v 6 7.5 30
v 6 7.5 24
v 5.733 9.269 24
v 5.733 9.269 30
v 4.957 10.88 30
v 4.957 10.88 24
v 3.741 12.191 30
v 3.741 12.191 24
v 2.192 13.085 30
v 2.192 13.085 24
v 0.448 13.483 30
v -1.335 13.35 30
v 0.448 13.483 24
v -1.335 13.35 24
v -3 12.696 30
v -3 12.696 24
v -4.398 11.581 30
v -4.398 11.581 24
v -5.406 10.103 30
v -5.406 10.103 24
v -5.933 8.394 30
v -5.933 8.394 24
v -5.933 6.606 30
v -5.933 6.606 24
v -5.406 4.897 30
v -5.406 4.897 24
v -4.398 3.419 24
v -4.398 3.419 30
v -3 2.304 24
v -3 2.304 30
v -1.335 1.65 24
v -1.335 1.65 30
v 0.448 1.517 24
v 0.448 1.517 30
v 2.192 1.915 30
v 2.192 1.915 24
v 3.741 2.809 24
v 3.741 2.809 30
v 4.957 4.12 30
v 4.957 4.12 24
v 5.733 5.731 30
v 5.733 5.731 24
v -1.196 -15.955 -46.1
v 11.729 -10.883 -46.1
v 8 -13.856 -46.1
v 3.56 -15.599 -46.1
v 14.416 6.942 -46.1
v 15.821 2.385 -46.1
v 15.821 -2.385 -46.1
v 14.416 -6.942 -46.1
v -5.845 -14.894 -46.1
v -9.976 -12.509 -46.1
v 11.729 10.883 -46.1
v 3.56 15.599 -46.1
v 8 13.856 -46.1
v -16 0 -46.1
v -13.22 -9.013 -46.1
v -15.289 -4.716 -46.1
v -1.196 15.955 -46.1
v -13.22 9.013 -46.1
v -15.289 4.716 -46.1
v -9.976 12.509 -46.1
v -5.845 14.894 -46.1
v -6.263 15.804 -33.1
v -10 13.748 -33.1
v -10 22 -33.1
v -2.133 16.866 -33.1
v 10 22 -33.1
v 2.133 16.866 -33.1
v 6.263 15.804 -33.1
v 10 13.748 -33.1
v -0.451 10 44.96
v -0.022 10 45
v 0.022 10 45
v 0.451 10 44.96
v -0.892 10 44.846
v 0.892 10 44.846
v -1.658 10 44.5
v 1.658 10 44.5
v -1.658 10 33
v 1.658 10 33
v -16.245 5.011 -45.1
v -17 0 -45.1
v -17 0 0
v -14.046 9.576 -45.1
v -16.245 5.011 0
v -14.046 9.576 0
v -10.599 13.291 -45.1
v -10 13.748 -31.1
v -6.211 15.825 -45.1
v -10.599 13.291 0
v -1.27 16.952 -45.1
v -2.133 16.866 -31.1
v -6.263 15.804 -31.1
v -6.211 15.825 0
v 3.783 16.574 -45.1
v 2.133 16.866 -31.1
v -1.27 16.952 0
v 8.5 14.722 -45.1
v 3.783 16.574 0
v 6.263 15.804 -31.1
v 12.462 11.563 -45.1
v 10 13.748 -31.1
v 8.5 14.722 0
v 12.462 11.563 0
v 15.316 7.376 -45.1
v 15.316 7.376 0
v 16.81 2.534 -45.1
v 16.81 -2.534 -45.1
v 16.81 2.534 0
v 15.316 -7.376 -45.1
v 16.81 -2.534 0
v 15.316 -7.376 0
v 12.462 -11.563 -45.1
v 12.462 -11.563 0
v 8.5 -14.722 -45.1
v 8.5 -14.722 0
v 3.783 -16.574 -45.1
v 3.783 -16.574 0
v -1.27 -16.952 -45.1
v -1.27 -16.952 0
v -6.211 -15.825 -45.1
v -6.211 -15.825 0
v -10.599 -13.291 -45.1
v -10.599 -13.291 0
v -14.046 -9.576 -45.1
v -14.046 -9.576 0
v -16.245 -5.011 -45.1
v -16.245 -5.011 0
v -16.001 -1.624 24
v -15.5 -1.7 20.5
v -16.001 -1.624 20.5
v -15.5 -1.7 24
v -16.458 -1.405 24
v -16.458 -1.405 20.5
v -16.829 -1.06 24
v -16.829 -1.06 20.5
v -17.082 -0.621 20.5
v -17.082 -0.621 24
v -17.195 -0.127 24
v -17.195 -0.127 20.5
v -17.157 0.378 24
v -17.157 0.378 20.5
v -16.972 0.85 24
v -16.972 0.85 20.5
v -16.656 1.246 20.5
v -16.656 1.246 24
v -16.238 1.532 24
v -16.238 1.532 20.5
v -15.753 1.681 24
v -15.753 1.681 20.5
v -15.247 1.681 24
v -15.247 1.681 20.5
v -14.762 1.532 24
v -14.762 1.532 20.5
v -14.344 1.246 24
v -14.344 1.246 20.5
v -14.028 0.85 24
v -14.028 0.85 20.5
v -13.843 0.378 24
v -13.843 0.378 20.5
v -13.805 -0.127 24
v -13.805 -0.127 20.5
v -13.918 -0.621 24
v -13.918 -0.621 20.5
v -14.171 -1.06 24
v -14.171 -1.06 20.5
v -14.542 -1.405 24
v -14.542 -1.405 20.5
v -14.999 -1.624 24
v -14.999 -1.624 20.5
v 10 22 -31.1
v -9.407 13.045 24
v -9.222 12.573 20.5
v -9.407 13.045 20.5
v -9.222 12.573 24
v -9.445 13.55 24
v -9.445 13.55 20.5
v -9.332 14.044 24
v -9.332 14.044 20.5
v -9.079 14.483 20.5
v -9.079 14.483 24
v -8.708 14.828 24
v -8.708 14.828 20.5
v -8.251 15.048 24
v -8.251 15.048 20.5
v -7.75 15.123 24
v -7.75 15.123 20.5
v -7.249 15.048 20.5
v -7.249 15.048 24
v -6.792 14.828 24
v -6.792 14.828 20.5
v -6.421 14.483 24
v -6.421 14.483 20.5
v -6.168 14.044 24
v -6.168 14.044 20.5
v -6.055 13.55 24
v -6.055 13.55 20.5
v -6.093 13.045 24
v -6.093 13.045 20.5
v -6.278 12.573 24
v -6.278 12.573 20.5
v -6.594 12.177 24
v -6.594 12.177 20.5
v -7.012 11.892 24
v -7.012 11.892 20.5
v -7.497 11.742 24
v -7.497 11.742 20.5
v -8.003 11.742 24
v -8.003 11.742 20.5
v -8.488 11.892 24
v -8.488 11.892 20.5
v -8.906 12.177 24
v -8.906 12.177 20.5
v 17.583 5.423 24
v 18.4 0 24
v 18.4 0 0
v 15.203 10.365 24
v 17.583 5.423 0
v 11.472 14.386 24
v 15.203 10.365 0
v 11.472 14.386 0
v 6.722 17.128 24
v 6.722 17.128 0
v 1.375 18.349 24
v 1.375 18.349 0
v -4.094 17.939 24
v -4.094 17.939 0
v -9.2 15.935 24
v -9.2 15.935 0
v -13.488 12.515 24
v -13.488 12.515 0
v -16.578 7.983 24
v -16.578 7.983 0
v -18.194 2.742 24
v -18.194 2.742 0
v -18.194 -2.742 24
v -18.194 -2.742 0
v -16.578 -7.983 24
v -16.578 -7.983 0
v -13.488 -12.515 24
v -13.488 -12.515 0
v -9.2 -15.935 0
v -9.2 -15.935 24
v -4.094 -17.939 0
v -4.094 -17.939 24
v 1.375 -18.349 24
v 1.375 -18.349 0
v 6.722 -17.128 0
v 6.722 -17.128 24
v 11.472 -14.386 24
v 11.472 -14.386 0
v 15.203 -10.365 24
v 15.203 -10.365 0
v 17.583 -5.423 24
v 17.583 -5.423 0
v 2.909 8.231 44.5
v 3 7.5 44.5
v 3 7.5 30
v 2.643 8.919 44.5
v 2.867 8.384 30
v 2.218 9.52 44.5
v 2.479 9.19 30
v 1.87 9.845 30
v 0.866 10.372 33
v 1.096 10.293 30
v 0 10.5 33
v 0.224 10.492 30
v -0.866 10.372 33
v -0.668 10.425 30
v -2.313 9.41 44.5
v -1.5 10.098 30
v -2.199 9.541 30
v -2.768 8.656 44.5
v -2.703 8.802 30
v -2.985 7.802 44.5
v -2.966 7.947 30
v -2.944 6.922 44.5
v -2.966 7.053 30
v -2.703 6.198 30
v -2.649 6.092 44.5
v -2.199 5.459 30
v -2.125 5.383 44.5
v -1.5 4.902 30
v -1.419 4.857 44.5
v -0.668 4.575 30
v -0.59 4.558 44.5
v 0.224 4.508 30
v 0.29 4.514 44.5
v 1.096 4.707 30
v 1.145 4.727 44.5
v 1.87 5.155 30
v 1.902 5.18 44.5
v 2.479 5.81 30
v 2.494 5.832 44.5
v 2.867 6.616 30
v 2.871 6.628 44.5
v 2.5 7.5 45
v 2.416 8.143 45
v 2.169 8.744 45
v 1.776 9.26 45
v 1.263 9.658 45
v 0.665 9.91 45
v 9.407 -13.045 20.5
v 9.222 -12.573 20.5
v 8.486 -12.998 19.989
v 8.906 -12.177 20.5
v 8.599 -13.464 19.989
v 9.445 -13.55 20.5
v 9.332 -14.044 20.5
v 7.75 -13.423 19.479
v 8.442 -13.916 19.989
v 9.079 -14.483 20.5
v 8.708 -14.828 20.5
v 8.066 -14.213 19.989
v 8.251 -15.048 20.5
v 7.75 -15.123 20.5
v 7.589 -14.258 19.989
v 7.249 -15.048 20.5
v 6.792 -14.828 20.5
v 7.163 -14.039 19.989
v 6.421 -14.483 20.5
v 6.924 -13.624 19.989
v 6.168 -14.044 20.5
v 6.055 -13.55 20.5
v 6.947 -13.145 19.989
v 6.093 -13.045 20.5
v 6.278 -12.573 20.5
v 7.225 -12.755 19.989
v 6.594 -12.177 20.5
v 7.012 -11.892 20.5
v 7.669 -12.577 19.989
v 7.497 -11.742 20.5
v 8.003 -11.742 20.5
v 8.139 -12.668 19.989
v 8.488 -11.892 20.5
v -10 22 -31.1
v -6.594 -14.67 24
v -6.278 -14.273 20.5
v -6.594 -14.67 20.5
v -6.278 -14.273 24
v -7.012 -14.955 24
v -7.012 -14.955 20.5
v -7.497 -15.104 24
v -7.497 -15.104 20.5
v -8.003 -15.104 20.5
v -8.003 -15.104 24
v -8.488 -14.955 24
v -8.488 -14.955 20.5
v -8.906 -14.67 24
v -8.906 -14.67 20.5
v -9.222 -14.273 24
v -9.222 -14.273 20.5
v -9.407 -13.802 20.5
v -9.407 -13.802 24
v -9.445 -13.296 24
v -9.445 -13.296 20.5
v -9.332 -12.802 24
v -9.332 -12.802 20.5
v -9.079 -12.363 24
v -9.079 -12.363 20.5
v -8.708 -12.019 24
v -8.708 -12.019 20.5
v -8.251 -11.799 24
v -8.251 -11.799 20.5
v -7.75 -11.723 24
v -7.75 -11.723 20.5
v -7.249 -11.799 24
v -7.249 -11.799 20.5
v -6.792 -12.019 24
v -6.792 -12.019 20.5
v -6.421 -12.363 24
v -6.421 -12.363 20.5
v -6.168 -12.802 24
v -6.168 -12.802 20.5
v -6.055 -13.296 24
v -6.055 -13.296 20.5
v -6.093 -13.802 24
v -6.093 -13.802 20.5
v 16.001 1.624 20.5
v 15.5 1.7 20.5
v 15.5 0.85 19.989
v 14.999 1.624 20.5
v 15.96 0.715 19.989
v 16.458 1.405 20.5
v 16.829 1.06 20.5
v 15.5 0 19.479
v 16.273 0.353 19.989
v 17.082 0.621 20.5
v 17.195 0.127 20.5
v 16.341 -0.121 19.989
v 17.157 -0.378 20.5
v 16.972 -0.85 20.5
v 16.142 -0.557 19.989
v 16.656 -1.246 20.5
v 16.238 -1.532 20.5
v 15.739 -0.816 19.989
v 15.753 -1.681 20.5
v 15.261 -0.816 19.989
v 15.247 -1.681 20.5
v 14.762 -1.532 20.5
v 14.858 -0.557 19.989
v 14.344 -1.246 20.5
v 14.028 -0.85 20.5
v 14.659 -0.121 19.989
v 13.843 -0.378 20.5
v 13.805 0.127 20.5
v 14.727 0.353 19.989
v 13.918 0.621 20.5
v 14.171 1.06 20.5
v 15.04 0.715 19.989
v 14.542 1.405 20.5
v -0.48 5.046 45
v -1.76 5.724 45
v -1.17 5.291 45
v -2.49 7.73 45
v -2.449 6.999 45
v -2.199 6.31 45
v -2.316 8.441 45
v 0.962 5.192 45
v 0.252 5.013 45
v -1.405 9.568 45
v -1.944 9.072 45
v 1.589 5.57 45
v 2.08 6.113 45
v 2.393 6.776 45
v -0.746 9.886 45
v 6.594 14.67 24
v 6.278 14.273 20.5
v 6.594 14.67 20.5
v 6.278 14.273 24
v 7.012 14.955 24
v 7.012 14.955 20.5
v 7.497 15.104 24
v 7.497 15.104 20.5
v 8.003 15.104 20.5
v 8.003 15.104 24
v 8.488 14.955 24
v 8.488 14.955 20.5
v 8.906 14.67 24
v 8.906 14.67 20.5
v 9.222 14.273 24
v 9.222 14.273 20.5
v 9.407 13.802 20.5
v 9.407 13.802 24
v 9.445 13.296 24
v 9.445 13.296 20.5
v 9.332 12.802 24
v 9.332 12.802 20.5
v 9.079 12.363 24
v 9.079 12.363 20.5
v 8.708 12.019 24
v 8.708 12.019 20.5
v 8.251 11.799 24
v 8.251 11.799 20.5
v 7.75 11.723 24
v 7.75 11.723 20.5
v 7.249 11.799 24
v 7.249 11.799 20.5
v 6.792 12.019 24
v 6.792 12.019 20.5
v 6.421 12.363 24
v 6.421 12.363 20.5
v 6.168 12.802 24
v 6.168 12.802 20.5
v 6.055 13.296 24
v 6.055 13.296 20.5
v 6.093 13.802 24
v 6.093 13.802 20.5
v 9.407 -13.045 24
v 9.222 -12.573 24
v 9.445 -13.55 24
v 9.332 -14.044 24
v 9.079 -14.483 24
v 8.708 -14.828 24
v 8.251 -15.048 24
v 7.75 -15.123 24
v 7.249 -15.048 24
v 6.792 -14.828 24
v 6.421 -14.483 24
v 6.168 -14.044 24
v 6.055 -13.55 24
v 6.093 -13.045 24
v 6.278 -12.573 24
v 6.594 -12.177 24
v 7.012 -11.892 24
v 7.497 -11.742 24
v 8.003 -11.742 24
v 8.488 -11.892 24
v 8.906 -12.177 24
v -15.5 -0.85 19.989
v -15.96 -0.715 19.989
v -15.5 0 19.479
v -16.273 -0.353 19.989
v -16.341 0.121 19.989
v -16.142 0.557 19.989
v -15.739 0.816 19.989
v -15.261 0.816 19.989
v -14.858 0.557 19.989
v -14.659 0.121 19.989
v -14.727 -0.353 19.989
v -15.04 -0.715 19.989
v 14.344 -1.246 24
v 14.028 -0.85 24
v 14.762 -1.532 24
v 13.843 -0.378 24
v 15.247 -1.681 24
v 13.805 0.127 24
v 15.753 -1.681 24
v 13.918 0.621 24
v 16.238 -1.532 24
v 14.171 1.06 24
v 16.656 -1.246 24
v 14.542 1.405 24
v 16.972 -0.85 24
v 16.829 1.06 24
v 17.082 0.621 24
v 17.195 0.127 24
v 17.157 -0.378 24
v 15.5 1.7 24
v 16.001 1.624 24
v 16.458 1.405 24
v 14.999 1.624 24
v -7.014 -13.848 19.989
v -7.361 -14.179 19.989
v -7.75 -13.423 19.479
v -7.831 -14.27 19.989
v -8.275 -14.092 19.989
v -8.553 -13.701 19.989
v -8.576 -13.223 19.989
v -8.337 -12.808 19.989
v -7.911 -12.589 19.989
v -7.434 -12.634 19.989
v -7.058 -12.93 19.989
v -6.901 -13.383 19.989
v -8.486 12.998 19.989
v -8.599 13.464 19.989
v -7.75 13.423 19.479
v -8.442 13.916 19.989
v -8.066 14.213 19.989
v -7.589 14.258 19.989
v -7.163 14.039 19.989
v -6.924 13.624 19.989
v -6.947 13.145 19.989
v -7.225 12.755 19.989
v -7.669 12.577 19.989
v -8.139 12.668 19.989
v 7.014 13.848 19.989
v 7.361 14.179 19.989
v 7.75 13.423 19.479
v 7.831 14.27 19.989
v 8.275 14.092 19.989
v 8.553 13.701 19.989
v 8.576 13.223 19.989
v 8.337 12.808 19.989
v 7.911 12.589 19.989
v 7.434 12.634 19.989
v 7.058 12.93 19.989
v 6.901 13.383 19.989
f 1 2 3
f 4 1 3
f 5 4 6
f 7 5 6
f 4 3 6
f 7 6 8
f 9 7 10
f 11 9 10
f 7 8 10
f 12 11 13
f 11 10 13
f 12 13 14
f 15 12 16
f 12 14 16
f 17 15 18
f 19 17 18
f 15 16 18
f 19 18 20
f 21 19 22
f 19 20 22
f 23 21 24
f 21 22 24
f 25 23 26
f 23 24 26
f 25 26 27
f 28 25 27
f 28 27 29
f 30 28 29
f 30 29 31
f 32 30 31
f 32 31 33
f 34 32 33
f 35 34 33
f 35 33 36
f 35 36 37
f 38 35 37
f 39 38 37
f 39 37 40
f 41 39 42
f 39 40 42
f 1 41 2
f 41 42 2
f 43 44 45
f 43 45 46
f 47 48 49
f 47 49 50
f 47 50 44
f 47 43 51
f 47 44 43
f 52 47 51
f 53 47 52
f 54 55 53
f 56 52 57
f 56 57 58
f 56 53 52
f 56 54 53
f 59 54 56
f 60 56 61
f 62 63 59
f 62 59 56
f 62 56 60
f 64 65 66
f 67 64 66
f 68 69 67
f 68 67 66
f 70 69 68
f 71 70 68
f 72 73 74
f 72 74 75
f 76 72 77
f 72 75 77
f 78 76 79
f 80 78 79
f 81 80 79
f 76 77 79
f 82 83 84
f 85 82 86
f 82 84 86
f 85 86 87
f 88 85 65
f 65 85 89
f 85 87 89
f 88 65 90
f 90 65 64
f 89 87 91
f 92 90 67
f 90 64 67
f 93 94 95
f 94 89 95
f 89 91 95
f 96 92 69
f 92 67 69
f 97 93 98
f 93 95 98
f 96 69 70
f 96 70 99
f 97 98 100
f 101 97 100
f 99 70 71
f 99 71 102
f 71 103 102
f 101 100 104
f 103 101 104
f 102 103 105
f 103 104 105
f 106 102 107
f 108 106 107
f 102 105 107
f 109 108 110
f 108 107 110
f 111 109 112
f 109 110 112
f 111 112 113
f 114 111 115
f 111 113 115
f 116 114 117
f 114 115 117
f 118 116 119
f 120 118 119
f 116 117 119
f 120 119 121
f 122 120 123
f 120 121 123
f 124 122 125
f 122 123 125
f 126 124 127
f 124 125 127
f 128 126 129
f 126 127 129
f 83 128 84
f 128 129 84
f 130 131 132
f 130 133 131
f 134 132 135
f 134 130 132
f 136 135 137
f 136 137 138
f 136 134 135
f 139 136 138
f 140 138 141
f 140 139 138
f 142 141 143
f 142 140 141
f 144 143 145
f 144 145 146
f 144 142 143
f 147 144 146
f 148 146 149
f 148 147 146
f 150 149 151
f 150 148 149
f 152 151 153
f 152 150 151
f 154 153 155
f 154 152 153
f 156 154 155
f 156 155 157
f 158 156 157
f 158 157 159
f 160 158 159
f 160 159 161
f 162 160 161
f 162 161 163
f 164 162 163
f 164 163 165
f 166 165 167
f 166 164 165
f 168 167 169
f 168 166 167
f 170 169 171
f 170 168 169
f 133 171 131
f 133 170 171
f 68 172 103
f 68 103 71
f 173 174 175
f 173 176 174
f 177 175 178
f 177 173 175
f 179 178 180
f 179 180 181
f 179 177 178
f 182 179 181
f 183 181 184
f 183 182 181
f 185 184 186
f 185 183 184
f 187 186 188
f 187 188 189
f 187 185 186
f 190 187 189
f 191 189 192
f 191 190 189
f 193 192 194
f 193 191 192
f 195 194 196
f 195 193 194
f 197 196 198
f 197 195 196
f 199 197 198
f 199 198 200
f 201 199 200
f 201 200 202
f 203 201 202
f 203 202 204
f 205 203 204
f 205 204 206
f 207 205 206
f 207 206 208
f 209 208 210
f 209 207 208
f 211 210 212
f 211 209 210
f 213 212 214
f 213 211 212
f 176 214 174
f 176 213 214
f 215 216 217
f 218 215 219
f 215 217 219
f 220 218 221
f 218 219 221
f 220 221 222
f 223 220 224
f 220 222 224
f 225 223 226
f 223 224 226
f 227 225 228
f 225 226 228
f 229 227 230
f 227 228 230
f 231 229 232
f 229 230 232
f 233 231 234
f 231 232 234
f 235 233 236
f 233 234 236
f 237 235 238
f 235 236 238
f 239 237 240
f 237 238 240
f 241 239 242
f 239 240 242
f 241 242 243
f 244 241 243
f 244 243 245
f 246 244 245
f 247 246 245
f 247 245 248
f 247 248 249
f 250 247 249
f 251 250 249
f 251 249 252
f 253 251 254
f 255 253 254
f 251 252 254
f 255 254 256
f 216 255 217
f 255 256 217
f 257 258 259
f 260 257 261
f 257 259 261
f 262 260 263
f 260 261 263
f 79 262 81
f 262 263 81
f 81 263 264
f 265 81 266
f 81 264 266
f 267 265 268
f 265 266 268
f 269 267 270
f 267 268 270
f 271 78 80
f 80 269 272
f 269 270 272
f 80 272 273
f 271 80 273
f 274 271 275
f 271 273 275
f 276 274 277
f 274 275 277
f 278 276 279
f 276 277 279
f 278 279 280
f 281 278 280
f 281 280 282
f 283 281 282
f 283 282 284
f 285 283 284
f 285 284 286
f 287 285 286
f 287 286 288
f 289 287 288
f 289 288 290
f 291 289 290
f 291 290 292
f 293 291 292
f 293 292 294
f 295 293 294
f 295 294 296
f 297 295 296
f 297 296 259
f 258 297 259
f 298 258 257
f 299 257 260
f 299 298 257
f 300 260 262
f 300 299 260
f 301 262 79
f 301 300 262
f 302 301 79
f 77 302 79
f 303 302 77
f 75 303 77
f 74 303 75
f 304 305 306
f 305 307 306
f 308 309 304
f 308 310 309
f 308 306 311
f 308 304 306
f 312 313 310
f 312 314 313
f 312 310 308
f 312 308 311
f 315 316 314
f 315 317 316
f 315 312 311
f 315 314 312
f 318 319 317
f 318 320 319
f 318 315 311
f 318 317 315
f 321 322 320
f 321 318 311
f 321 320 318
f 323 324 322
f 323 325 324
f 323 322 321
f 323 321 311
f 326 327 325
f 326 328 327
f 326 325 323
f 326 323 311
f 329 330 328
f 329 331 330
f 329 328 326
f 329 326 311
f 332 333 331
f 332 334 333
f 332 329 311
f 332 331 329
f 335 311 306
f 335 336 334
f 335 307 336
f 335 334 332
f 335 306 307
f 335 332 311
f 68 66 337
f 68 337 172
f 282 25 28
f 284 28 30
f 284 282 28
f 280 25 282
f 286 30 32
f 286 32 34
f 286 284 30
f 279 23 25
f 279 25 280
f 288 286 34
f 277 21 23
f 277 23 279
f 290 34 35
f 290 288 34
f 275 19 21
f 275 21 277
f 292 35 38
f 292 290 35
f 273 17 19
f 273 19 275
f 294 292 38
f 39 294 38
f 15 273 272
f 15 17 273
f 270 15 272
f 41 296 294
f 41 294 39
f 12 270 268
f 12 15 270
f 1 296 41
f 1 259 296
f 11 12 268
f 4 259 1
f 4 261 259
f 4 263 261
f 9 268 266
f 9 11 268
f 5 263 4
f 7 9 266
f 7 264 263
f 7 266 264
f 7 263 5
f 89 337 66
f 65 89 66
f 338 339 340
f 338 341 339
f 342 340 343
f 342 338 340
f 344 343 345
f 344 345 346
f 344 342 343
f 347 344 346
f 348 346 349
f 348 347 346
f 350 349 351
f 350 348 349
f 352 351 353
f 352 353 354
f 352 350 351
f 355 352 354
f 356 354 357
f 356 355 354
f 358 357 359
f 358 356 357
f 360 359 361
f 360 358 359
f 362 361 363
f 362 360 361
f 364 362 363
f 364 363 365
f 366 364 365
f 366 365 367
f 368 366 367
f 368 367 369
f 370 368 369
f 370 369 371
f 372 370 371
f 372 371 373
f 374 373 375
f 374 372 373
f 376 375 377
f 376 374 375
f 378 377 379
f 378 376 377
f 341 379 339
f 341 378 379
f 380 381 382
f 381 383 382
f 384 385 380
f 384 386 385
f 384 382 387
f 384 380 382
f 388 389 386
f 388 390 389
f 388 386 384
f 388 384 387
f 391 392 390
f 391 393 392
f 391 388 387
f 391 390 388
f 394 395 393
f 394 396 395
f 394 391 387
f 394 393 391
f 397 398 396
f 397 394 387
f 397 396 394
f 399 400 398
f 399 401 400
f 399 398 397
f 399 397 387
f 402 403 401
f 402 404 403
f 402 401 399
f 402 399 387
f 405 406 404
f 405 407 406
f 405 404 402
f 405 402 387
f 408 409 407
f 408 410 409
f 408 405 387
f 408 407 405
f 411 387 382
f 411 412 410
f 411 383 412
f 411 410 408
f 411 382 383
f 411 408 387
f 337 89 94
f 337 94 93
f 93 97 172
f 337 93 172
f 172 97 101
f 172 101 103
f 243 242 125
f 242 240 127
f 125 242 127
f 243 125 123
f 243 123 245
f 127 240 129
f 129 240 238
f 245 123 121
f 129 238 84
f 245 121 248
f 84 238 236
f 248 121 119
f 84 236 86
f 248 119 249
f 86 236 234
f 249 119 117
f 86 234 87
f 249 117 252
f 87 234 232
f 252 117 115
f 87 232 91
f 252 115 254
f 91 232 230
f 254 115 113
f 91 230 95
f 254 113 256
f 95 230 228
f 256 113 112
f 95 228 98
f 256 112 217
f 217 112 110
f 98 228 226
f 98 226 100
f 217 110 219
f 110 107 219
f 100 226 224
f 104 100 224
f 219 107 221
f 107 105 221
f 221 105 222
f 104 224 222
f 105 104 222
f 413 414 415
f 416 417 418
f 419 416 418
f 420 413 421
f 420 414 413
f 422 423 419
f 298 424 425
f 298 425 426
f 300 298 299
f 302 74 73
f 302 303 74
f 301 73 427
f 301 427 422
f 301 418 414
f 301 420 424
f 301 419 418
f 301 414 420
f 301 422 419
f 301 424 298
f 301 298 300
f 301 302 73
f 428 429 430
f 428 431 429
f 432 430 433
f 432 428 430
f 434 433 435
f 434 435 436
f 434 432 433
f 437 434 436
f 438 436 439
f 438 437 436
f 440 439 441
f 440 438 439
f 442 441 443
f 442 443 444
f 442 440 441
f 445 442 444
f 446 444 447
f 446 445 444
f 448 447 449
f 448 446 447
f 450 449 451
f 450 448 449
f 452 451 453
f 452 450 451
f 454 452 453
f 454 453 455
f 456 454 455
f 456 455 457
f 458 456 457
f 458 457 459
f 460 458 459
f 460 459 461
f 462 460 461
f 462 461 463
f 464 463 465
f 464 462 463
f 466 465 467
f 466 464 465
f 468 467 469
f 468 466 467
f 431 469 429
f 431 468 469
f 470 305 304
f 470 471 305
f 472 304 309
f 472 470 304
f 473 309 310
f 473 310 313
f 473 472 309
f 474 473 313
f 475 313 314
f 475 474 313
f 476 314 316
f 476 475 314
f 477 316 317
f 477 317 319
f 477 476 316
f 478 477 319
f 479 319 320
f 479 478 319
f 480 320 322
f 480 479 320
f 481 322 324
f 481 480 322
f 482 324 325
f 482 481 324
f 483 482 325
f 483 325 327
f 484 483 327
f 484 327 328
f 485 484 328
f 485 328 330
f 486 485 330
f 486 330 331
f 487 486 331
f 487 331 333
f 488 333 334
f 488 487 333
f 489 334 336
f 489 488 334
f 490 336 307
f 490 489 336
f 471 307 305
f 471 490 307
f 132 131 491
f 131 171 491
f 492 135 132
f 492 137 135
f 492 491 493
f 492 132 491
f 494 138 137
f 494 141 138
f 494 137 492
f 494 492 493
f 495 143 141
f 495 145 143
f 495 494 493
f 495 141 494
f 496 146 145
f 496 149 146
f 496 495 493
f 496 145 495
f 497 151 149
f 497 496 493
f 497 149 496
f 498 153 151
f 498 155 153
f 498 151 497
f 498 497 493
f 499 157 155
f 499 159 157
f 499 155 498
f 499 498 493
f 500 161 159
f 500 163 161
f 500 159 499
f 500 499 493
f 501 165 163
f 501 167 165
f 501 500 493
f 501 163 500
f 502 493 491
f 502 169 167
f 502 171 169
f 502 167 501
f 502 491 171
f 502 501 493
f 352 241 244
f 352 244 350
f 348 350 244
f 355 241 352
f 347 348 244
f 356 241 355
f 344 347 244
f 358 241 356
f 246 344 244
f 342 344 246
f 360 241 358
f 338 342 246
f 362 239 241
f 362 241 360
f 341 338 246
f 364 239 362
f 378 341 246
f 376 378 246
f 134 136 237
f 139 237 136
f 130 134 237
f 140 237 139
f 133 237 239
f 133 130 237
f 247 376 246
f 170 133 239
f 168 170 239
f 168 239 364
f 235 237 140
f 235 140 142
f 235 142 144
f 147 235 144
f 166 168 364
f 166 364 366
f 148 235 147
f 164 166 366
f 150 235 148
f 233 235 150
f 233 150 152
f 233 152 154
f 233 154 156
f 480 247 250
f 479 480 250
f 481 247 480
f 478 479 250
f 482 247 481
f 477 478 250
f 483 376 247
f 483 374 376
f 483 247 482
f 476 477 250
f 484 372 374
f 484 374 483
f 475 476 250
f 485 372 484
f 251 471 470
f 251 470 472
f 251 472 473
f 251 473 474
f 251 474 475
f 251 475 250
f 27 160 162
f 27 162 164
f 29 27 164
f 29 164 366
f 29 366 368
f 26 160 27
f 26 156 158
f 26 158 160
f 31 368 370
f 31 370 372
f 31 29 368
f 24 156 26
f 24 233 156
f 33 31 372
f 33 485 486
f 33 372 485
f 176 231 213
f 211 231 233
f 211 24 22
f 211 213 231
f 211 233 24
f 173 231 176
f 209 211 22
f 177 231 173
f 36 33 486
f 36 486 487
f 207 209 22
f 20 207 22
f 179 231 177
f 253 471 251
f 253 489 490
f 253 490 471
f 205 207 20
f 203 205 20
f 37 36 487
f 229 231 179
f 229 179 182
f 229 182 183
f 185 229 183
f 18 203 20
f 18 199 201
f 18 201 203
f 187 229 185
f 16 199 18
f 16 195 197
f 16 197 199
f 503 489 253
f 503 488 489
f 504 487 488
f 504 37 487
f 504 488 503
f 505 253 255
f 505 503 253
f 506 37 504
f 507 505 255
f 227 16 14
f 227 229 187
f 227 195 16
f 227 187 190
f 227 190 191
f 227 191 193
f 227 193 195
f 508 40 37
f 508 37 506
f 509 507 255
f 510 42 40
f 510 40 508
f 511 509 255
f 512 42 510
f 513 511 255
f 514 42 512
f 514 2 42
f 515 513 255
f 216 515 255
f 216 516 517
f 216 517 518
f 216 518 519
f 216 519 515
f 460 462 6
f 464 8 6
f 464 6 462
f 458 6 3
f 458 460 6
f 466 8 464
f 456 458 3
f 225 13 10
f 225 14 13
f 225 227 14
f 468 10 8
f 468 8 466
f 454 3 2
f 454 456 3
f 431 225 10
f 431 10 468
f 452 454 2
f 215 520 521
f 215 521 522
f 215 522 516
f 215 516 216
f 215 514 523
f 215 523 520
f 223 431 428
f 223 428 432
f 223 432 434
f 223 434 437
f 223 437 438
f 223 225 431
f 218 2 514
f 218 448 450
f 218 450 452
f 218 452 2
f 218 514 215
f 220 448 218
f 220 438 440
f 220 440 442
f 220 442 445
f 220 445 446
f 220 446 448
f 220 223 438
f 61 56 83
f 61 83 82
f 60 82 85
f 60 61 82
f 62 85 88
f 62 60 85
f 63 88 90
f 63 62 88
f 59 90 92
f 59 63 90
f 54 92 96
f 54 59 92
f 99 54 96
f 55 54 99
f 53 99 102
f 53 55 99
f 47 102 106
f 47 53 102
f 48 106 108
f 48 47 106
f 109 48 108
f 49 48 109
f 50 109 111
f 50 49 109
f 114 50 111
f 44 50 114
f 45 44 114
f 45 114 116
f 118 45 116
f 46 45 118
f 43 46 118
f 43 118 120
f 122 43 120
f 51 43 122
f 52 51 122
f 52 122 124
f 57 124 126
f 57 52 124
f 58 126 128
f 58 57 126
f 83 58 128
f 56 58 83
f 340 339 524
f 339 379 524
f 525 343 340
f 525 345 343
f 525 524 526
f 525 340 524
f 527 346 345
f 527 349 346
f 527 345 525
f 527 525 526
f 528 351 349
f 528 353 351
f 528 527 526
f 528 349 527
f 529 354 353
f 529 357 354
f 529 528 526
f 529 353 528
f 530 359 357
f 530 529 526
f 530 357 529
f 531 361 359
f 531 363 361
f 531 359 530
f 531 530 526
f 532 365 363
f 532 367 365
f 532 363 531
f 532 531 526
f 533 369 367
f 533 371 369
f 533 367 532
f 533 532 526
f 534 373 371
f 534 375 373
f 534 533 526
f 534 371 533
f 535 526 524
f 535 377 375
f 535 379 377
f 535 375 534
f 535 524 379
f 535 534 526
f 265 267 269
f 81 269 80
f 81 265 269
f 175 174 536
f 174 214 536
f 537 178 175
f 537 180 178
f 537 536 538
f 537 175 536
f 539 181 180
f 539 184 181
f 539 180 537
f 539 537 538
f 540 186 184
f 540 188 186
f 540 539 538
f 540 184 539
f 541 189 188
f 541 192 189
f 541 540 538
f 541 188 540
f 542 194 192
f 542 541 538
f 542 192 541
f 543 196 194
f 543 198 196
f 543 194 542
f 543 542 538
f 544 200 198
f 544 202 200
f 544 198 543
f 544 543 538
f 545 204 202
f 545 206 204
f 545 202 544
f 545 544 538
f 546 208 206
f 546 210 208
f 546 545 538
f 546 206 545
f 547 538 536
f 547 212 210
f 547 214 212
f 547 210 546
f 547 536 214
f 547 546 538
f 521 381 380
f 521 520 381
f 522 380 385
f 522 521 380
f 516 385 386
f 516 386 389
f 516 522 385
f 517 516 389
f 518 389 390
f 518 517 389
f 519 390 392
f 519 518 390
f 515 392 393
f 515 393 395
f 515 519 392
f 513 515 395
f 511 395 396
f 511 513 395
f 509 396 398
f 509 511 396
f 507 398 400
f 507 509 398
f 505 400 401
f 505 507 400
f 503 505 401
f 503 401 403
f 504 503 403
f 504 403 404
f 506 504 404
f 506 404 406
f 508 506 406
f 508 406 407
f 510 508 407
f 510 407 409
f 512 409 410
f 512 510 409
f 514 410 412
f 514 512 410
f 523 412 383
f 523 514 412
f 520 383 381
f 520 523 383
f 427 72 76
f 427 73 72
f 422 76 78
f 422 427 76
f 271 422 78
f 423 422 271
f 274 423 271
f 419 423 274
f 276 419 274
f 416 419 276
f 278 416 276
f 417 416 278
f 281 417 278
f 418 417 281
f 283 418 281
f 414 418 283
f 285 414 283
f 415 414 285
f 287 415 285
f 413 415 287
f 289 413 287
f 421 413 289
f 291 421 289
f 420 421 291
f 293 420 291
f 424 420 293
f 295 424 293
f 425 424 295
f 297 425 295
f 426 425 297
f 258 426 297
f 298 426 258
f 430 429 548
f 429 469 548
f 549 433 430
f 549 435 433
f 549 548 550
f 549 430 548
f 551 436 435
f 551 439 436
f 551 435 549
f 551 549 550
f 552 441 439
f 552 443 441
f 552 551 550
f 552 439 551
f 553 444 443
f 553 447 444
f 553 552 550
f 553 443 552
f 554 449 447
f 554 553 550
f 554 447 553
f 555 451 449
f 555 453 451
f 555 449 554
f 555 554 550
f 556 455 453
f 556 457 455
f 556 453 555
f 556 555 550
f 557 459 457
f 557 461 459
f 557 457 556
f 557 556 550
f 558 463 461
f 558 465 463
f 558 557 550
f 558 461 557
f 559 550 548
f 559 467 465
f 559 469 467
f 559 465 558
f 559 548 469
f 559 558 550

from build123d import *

# Parameters (mm, degrees)
SKETCH2_R           = 18.4
BOSS_EXTRUDE1_DEPTH = 24
SKETCH3_R           = 17
BOSS_EXTRUDE2_DEPTH = 46.1
CHAMFER1_SIZE       = 1
SKETCH6_R           = 6
BOSS_EXTRUDE5_DEPTH = 6
SKETCH7_R           = 3
BOSS_EXTRUDE6_DEPTH = 15
CUT_EXTRUDE1_DEPTH  = 12
CHAMFER2_SIZE       = 0.5
CIRPATTERN1_COUNT   = 6
SKETCH11_W          = 20
SKETCH11_H          = 2
BOSS_EXTRUDE7_DEPTH = 22


with BuildPart() as part:
    # Sketch2 → Boss-Extrude1 (new body)
    with BuildSketch(Plane.XY):
        Circle(SKETCH2_R)
    extrude(amount=BOSS_EXTRUDE1_DEPTH)

    # Sketch3 → Boss-Extrude2 (add)
    with BuildSketch(Plane(origin=(0, 0, 0), x_dir=(-1, 0, 0), z_dir=(0, 0, -1))):
        Circle(SKETCH3_R)
    extrude(amount=BOSS_EXTRUDE2_DEPTH)

    # Chamfer1
    chamfer1_edges = [part.edges().sort_by_distance(p)[0] for p in [
        (17, 0, -46.1),
    ]]
    chamfer(chamfer1_edges, length=CHAMFER1_SIZE)

    # Sketch6 → Boss-Extrude5 (add)
    with BuildSketch(Plane.XY.offset(24)):
        with Locations((0, 7.5)):
            Circle(SKETCH6_R)
    extrude(amount=BOSS_EXTRUDE5_DEPTH)

    # Sketch7 → Boss-Extrude6 (add)
    with BuildSketch(Plane.XY.offset(30)):
        with Locations((0, 7.5)):
            Circle(SKETCH7_R)
    extrude(amount=BOSS_EXTRUDE6_DEPTH)

    # Sketch8 → Cut-Extrude1 (cut)
    with BuildSketch(Plane.XY.offset(45)):
        Polygon((-81.196672921, 10), (-1.658312395, 10), (1.658312395, 10), (81.196672921, 10), (81.196672921, 169.076721051), (-81.196672921, 169.076721051), align=None)
    extrude(amount=-CUT_EXTRUDE1_DEPTH, mode=Mode.SUBTRACT)

    # Chamfer2
    chamfer2_edges = [part.edges().sort_by_distance(p)[0] for p in [
        (-1.418637165, 4.856617963, 45),
    ]]
    chamfer(chamfer2_edges, length=CHAMFER2_SIZE - 0.0001)  # a hair under: the kernel refuses the full size

    # Sketch10 → M3 Clearance Hole1 (revolve, cut)
    with BuildSketch(Plane(origin=(-15.5, 0, 24), x_dir=(0, -1, 0), z_dir=(1, 0, 0))):
        Polygon((0, 0), (0, 4.521463052), (1.7, 3.5), (1.7, 0), align=None)
    m3_clearance_hole1 = revolve(axis=Axis((-15.5, 0, 30.35), (0, 0, -1)), mode=Mode.SUBTRACT)

    # CirPattern1: M3 Clearance Hole1 ×6 about axis
    cirpattern1_axis = Axis((0, 0, 0), (0, 0, 1))
    for i in range(1, CIRPATTERN1_COUNT):
        add(m3_clearance_hole1.rotate(cirpattern1_axis, i * 360 / CIRPATTERN1_COUNT), mode=Mode.SUBTRACT)

    # Sketch11 → Boss-Extrude7 (add)
    with BuildSketch(Plane(origin=(0, 0, 0), x_dir=(1, 0, 0), z_dir=(0, 1, 0))):
        with Locations((0, 32.1)):
            Rectangle(SKETCH11_W, SKETCH11_H)
    extrude(amount=BOSS_EXTRUDE7_DEPTH)


solid = part.part
